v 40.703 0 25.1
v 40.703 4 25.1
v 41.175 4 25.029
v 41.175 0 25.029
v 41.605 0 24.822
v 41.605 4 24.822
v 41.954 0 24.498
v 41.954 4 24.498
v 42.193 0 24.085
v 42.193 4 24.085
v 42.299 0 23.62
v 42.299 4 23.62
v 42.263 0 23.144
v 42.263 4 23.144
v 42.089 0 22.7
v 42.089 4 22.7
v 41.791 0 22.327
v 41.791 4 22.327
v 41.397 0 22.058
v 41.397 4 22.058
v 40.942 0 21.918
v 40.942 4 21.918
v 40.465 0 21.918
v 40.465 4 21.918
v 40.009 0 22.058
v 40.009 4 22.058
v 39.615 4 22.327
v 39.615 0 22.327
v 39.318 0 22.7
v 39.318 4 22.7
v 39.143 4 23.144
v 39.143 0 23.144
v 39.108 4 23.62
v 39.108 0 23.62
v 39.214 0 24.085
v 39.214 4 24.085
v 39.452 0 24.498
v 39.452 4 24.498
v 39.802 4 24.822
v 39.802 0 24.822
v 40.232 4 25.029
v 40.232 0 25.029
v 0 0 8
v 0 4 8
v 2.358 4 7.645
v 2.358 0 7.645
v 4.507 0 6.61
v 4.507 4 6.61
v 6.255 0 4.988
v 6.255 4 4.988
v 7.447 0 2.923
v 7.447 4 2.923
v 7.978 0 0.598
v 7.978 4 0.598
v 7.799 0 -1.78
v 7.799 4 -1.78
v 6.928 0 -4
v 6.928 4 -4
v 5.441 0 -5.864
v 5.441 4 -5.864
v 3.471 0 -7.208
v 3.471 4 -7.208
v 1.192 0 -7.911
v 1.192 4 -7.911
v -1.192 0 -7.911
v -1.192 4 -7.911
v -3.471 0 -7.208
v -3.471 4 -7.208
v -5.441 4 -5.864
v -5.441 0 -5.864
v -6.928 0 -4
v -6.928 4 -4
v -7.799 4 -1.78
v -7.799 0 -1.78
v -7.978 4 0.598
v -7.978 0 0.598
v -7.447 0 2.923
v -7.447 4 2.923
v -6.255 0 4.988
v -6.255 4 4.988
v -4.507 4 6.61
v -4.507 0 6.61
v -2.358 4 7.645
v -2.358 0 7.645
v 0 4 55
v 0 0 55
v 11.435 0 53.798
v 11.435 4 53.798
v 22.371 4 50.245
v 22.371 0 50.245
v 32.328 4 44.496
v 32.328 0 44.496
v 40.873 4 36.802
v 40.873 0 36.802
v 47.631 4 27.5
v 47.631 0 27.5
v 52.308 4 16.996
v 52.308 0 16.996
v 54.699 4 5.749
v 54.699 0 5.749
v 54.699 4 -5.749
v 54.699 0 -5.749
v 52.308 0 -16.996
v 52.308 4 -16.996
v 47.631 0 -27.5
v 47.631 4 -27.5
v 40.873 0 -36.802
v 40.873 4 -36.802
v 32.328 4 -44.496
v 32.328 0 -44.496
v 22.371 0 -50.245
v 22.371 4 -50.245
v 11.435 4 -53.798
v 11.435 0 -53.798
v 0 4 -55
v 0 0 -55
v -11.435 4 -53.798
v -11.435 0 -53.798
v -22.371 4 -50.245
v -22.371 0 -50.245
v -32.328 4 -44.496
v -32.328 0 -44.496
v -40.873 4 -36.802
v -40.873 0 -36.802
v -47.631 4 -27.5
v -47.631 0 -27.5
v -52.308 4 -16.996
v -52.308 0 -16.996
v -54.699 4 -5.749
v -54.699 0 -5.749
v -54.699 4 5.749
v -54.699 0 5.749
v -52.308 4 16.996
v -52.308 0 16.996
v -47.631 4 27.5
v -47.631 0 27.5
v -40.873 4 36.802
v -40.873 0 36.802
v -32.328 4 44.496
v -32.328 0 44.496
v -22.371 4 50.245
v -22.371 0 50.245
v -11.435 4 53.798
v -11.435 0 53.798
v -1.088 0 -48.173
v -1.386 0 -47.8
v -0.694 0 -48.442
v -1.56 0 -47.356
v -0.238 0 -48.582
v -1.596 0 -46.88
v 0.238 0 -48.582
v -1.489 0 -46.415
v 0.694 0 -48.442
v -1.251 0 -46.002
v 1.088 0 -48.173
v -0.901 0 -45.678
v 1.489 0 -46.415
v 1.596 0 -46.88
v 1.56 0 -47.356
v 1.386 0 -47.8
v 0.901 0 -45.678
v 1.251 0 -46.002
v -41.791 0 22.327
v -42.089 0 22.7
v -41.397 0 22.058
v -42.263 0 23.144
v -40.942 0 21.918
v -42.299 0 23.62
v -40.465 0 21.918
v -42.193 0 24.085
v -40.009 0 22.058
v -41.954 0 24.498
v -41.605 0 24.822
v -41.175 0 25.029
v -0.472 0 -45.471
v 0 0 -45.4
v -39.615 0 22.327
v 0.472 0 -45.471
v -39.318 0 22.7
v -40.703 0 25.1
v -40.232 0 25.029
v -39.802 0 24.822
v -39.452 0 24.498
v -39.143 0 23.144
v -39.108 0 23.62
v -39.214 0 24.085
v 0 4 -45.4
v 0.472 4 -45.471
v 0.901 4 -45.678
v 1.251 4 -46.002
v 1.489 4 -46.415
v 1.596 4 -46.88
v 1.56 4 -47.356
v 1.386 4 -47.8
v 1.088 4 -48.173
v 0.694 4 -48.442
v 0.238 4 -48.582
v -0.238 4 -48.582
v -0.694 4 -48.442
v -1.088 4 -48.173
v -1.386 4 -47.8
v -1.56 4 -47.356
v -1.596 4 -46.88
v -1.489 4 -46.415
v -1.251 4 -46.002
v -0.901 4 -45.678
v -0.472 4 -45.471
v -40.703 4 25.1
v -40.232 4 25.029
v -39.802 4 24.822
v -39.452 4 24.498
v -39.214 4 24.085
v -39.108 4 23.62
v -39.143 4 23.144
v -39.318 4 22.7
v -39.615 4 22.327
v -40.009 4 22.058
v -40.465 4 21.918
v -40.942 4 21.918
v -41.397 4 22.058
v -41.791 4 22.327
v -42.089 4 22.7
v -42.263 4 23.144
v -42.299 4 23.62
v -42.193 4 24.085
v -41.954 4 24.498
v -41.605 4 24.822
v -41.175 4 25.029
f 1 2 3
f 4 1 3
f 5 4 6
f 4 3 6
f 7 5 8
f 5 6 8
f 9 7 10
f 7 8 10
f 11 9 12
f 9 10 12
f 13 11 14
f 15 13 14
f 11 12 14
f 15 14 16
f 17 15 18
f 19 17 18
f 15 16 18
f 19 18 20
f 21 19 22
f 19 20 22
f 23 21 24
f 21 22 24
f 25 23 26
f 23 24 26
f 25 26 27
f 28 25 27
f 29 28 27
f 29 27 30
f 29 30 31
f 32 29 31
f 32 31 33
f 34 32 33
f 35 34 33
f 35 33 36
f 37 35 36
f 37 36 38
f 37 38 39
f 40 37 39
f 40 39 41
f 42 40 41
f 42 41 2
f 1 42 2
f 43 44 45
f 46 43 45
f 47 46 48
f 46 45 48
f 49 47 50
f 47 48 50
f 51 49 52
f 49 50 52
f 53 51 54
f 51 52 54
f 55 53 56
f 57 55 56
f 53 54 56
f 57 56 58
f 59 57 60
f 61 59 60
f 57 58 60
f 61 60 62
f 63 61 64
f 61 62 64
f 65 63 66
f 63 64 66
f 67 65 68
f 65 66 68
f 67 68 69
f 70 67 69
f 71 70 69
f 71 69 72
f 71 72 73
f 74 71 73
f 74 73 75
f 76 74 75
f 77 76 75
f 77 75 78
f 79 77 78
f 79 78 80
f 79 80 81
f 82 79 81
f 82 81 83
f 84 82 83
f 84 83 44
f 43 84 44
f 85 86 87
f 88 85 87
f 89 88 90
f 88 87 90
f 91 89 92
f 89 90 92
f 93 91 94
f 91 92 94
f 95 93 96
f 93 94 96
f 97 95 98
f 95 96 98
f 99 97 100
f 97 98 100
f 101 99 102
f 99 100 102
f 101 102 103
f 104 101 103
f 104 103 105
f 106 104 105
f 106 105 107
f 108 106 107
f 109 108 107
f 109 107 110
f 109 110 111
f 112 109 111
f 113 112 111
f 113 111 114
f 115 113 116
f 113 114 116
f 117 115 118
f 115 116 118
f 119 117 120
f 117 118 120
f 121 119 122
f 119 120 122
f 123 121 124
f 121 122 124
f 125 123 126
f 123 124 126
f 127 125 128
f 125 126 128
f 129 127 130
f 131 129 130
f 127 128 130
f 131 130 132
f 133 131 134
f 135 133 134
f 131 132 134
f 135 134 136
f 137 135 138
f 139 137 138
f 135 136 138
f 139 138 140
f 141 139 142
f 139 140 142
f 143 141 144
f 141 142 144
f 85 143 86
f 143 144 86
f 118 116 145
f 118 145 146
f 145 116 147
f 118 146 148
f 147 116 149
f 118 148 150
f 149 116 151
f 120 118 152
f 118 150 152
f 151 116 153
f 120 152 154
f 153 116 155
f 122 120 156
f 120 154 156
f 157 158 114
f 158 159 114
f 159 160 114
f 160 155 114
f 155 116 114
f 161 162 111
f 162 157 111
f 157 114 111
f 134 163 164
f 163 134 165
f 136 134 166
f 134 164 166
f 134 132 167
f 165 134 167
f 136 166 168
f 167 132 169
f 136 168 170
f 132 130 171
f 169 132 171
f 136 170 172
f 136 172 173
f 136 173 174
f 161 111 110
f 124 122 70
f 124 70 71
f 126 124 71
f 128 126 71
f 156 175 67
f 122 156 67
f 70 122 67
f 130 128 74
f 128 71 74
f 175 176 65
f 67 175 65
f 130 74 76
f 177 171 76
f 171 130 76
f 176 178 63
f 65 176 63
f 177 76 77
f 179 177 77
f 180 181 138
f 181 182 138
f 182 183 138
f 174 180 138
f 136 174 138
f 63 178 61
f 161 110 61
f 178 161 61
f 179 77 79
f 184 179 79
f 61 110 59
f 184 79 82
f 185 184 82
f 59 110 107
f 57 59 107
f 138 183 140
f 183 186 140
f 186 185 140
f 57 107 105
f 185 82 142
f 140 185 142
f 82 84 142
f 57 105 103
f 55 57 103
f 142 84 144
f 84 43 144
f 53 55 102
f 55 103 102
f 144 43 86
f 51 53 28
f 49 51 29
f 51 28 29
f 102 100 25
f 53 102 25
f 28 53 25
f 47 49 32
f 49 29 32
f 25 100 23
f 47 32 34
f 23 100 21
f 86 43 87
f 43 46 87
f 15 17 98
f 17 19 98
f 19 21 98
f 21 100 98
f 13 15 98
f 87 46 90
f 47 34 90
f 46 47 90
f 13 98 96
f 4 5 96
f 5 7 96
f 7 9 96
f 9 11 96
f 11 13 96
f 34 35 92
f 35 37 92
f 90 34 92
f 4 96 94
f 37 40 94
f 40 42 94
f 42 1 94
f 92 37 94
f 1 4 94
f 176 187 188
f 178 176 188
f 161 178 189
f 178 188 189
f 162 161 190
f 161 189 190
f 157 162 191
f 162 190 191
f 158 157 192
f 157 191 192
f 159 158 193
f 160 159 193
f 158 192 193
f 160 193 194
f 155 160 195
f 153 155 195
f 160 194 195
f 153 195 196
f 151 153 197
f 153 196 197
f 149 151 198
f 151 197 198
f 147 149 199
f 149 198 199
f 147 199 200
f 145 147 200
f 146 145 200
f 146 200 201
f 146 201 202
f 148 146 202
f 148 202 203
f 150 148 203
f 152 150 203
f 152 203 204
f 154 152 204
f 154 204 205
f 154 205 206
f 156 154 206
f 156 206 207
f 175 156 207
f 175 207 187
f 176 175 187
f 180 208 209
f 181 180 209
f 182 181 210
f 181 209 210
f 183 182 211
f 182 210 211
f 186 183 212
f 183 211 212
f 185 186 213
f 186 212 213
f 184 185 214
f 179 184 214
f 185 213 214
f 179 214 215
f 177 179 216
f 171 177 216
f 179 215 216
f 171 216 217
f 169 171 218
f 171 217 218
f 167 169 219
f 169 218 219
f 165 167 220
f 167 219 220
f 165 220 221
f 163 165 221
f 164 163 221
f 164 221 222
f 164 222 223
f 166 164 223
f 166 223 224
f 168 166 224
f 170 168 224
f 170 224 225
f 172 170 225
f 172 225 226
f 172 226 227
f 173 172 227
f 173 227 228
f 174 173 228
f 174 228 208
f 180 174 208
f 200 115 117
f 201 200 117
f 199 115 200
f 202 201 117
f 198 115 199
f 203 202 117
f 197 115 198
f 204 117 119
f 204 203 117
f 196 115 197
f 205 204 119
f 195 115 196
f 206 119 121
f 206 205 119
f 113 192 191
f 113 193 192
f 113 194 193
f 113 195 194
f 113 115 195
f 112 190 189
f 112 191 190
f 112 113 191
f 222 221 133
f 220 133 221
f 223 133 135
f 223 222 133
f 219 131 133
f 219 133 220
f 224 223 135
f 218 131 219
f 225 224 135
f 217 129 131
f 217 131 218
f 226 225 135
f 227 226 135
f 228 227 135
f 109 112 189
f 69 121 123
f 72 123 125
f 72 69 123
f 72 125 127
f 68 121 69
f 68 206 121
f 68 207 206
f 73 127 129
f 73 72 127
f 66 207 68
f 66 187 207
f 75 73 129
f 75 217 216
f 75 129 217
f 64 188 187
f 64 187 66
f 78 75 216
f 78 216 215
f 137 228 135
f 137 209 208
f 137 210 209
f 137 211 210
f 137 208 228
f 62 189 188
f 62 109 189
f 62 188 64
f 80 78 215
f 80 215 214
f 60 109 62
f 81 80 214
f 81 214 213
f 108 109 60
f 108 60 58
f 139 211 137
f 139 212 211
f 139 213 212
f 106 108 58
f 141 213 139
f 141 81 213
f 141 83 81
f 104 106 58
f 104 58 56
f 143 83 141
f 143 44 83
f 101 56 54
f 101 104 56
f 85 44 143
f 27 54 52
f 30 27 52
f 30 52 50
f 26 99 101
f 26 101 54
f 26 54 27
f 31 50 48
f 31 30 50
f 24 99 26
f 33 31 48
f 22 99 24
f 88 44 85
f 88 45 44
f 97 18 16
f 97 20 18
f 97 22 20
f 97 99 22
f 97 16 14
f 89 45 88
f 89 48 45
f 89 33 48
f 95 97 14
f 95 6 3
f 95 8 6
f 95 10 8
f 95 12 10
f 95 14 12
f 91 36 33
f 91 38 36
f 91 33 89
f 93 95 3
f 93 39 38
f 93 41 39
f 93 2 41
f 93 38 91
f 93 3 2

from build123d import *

# Parameters (mm, degrees)
SCHIZZO1_R                   = 55
ESTRUSIONE_ESTRUSIONE1_DEPTH = 4
SCHIZZO2_R                   = 8
SCHIZZO2_R_2                 = 1.6
TAGLIO_ESTRUSIONE1_DEPTH     = 78.884529914


with BuildPart() as part:
    # Schizzo1 → Estrusione-Estrusione1 (new body)
    with BuildSketch(Plane(origin=(0, 0, 0), x_dir=(1, 0, 0), z_dir=(0, 1, 0))):
        with Locations(Location((0, 0, 0), (0, 0, 270))):
            Circle(SCHIZZO1_R)
    extrude(amount=ESTRUSIONE_ESTRUSIONE1_DEPTH)

    # Schizzo2 → Taglio-Estrusione1 (cut, through all)
    with BuildSketch(Plane(origin=(0, 4, 0), x_dir=(1, 0, 0), z_dir=(0, 1, 0))):
        with Locations(Location((0, 0, 0), (0, 0, 270))):
            Circle(SCHIZZO2_R)
        with Locations(Location((0, 47, 0), (0, 0, 270))):
            Circle(SCHIZZO2_R_2)
        with Locations(Location((40.703193978, -23.5, 0), (0, 0, 270))):
            Circle(SCHIZZO2_R_2)
        with Locations(Location((-40.703193978, -23.5, 0), (0, 0, 270))):
            Circle(SCHIZZO2_R_2)
    extrude(amount=-TAGLIO_ESTRUSIONE1_DEPTH, mode=Mode.SUBTRACT)


solid = part.part
